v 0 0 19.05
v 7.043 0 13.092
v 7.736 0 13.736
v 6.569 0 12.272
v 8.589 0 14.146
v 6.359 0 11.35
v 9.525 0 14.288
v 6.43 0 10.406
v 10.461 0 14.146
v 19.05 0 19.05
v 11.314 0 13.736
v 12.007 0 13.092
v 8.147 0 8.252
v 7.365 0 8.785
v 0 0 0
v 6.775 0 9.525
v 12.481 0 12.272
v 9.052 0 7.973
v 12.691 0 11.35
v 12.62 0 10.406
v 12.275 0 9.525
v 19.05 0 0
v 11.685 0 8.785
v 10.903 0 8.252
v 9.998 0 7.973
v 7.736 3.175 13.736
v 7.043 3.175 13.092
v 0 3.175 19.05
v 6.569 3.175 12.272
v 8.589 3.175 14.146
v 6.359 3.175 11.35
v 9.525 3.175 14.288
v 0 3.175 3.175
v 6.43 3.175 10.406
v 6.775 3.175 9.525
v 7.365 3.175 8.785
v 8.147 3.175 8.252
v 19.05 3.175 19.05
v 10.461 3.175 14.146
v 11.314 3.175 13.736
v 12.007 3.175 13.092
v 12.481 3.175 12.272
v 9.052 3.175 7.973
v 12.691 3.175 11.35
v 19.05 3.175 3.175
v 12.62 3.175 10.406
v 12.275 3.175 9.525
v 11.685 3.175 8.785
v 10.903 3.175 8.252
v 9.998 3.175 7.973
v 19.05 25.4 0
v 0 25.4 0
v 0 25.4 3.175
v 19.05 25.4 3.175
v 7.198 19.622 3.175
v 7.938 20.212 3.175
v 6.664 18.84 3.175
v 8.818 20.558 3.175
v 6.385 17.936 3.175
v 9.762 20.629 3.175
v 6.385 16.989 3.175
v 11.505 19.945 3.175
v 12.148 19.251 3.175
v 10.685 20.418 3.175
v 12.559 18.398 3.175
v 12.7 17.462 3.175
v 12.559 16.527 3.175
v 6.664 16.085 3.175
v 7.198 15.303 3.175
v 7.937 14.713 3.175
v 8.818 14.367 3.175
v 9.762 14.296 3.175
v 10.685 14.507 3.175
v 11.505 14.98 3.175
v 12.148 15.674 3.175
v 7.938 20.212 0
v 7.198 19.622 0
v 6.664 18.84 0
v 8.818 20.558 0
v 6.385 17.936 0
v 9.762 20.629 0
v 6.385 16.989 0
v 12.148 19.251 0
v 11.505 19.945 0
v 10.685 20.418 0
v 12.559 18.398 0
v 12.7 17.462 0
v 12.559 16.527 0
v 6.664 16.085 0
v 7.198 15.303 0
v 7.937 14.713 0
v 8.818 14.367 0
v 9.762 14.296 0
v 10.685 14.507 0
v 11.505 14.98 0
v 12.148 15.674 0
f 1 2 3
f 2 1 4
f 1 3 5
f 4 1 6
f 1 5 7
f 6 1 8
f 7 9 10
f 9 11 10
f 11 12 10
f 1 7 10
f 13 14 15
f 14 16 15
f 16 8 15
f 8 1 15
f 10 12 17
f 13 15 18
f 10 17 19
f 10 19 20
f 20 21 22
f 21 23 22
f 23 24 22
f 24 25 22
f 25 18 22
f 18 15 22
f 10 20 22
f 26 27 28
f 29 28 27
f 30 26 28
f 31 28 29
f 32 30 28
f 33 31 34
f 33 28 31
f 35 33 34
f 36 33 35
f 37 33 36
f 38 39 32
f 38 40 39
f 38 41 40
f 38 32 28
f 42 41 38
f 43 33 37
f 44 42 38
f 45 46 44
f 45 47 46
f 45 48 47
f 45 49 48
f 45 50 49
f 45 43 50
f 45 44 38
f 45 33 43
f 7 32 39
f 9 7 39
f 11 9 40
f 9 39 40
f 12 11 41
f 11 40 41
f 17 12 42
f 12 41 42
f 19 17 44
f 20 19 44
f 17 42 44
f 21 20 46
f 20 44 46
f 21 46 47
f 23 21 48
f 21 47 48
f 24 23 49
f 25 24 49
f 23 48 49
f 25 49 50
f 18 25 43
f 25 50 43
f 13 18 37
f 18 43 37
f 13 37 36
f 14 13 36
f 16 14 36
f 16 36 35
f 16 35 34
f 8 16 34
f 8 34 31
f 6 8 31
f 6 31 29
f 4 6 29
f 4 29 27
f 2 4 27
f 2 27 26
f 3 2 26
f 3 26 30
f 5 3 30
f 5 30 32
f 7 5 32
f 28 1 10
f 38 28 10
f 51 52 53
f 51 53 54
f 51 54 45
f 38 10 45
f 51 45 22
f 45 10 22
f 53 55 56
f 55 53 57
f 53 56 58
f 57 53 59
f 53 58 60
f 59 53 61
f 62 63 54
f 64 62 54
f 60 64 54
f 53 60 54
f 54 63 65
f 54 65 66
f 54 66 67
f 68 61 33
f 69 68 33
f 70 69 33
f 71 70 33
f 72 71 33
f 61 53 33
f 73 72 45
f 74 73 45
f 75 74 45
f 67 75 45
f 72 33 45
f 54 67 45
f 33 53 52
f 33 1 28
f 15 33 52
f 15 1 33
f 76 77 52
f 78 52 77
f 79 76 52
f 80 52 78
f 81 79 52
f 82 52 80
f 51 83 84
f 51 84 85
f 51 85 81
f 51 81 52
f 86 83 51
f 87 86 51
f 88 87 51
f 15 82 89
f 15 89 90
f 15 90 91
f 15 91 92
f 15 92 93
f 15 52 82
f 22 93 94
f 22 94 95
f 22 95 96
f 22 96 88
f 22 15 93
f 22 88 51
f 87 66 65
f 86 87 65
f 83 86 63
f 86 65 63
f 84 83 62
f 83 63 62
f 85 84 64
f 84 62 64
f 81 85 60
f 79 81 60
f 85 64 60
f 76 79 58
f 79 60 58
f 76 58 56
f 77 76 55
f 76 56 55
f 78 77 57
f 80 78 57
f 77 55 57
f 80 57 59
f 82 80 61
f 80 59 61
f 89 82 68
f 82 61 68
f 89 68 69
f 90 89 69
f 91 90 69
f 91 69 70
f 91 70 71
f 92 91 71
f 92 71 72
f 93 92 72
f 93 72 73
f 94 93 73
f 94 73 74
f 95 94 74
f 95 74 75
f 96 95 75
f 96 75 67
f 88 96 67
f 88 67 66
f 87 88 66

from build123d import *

# Parameters (mm, degrees)
SKETCH1_W           = 19.05
SKETCH1_H           = 19.05
BOSS_EXTRUDE1_DEPTH = 3.175
SKETCH2_W           = 19.05
SKETCH2_H           = 3.175
BOSS_EXTRUDE2_DEPTH = 22.225
CUT_EXTRUDE1_REACH  = 36.925
SKETCH3_R           = 3.175
CUT_EXTRUDE2_REACH  = 37.498
SKETCH4_R           = 3.175


with BuildPart() as part:
    # Sketch1 → Boss-Extrude1 (new body)
    with BuildSketch(Plane(origin=(0, 0, 0), x_dir=(1, 0, 0), z_dir=(0, 1, 0))):
        with Locations((9.525, -9.525)):
            Rectangle(SKETCH1_W, SKETCH1_H)
    extrude(amount=BOSS_EXTRUDE1_DEPTH)

    # Sketch2 → Boss-Extrude2 (add)
    with BuildSketch(Plane(origin=(0, 3.175, 0), x_dir=(1, 0, 0), z_dir=(0, 1, 0))):
        with Locations((9.525, -1.5875)):
            Rectangle(SKETCH2_W, SKETCH2_H)
    extrude(amount=BOSS_EXTRUDE2_DEPTH)

    # Sketch3 → Cut-Extrude1 (cut, up to next)
    with BuildSketch(Plane(origin=(0, 3.175, 0), x_dir=(1, 0, 0), z_dir=(0, 1, 0)), mode=Mode.PRIVATE) as cut_extrude1_sk1:
        with Locations(Location((9.525, -11.1125, 0), (0, 0, 270))):
            Circle(SKETCH3_R)
    cut_extrude1_tool1 = extrude(cut_extrude1_sk1.sketch, amount=-CUT_EXTRUDE1_REACH, mode=Mode.PRIVATE) & part.part
    add(cut_extrude1_tool1.solids().sort_by_distance((9.525, 3.175, 11.1125))[0], mode=Mode.SUBTRACT)

    # Sketch4 → Cut-Extrude2 (cut, up to next)
    with BuildSketch(Plane.XY.offset(3.175), mode=Mode.PRIVATE) as cut_extrude2_sk1:
        with Locations((9.525, 17.4625)):
            Circle(SKETCH4_R)
    cut_extrude2_tool1 = extrude(cut_extrude2_sk1.sketch, amount=-CUT_EXTRUDE2_REACH, mode=Mode.PRIVATE) & part.part
    add(cut_extrude2_tool1.solids().sort_by_distance((9.525, 17.4625, 3.175))[0], mode=Mode.SUBTRACT)


solid = part.part
